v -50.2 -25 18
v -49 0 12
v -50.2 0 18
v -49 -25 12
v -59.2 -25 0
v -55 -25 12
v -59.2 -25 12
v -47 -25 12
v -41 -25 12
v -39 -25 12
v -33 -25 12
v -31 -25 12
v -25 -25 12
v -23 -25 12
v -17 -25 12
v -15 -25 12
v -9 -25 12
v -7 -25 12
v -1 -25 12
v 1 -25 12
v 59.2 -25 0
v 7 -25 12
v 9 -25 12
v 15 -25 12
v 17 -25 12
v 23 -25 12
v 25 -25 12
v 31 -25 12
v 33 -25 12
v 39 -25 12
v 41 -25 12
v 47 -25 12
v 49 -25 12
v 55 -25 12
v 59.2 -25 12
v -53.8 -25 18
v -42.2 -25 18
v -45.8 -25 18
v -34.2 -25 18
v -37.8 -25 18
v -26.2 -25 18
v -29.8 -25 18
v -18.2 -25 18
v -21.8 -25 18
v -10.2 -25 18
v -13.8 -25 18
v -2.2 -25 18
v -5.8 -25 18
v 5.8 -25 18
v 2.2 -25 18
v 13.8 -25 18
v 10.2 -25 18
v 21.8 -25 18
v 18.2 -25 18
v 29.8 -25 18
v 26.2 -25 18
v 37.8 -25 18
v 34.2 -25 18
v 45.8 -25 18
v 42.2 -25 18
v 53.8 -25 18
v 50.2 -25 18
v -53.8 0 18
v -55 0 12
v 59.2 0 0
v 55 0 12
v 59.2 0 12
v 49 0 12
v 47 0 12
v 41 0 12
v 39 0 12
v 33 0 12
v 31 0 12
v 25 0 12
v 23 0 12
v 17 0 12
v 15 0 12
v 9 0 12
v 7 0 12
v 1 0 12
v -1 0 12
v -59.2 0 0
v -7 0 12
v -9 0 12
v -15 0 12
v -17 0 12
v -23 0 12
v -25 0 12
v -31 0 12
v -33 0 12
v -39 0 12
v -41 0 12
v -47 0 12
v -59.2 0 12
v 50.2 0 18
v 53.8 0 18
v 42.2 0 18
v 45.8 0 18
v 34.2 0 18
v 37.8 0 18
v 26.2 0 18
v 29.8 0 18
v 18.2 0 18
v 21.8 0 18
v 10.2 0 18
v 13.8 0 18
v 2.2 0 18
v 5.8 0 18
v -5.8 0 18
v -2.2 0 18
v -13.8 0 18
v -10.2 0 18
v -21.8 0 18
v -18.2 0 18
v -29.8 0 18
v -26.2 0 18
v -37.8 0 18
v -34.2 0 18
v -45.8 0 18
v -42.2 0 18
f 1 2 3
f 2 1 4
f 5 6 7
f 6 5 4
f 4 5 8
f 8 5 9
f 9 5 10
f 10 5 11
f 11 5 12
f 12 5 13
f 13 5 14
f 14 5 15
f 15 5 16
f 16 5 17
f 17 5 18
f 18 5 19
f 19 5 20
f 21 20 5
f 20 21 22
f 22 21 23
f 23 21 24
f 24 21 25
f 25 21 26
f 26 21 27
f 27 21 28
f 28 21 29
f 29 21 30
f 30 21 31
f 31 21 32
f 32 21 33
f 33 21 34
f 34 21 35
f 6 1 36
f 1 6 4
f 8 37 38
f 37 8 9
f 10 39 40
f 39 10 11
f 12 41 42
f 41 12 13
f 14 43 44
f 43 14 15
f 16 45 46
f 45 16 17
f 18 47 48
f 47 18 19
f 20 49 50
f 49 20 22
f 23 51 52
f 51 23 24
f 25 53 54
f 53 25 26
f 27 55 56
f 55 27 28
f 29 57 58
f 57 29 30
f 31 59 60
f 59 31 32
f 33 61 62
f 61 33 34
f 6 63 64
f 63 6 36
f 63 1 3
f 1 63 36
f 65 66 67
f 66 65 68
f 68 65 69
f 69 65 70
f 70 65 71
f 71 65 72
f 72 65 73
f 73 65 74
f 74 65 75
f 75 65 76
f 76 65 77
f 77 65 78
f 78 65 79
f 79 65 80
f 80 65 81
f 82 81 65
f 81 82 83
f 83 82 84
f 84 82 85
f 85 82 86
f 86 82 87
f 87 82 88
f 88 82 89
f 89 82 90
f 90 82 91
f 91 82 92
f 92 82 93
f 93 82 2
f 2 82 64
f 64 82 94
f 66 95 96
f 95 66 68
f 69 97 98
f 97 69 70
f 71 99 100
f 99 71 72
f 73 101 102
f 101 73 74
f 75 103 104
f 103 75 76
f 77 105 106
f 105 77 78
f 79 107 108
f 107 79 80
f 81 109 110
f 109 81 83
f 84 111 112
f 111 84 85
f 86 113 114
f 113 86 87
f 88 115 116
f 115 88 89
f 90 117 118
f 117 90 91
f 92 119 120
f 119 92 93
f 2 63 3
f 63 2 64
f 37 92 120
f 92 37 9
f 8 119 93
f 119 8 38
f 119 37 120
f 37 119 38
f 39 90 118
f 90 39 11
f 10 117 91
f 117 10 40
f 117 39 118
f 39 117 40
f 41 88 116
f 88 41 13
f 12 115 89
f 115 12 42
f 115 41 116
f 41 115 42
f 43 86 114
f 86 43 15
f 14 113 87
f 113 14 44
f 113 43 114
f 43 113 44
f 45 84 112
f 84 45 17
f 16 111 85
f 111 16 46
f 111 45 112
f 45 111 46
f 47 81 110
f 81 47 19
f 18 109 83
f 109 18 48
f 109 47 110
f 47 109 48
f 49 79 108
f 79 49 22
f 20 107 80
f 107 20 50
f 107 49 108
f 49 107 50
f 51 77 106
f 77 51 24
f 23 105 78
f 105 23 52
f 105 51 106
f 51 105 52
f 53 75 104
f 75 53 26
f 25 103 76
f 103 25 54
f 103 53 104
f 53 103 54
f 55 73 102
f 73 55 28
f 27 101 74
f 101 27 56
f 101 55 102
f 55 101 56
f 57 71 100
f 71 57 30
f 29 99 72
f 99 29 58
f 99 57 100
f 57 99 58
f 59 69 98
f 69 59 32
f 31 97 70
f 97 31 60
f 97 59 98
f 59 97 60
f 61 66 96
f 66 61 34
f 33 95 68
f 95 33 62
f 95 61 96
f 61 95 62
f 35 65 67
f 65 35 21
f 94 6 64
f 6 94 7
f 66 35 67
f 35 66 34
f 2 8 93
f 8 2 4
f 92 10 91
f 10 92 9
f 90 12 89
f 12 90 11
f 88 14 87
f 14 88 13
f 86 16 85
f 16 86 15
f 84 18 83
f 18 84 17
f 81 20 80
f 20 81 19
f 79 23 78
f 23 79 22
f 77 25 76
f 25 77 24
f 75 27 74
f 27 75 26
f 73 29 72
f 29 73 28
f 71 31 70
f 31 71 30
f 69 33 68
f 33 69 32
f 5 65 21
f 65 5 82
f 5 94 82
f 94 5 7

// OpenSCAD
$fn = 32;

// ----------------------------------------------------------------------
// Toothed rack, 14 teeth
// 8 mm pitch, 6 mm teeth
// ----------------------------------------------------------------------

// --- parameters (mm) ---
bar_w = 25;     // bar width (Y)
bar_h = 12;     // bar height (Z)
teeth = 14;     // number of teeth
pitch = 8;      // tooth pitch
tooth_h = 6;    // tooth height above the bar
root_w = 6.4;   // tooth width at the root
crest_w = 3.6;  // tooth width at the crest

// --- derived feature positions (mm) ---
span = (teeth - 1) * pitch;  // = 104   distance between the outer teeth
bar_l = span + root_w + 8;   // = 118.4   bar length: teeth plus 4 mm at each end
tooth_x = -span / 2;         // = -52   X of the first tooth
height = bar_h + tooth_h;    // = 18   overall height
feature_centers = [
  [tooth_x + 0 * pitch, -bar_w / 2],
  [tooth_x + 1 * pitch, -bar_w / 2],
  [tooth_x + 2 * pitch, -bar_w / 2],
  [tooth_x + 3 * pitch, -bar_w / 2],
  [tooth_x + 4 * pitch, -bar_w / 2],
  [tooth_x + 5 * pitch, -bar_w / 2],
  [tooth_x + 6 * pitch, -bar_w / 2],
  [tooth_x + 7 * pitch, -bar_w / 2],
  [tooth_x + 8 * pitch, -bar_w / 2],
  [tooth_x + 9 * pitch, -bar_w / 2],
  [tooth_x + 10 * pitch, -bar_w / 2],
  [tooth_x + 11 * pitch, -bar_w / 2],
  [tooth_x + 12 * pitch, -bar_w / 2],
  [tooth_x + 13 * pitch, -bar_w / 2]
];   // tooth centre line, drives the tooth loop

// bar with a rack of teeth, one extruded trapezoium per centre
module rack_tooth() {
  linear_extrude(height = bar_w)
    polygon(points = [
      [0, 0],
      [root_w, 0],
      [root_w / 2 + crest_w / 2, tooth_h + 1],
      [root_w / 2 - crest_w / 2, tooth_h + 1]
    ]);
}

union() {
  translate([-bar_l / 2, -bar_w, 0]) cube([bar_l, bar_w, bar_h]);
  for (centre = feature_centers)
    translate([centre[0] - root_w / 2, 0, bar_h - 1]) rotate([90, 0, 0]) rack_tooth();
}
